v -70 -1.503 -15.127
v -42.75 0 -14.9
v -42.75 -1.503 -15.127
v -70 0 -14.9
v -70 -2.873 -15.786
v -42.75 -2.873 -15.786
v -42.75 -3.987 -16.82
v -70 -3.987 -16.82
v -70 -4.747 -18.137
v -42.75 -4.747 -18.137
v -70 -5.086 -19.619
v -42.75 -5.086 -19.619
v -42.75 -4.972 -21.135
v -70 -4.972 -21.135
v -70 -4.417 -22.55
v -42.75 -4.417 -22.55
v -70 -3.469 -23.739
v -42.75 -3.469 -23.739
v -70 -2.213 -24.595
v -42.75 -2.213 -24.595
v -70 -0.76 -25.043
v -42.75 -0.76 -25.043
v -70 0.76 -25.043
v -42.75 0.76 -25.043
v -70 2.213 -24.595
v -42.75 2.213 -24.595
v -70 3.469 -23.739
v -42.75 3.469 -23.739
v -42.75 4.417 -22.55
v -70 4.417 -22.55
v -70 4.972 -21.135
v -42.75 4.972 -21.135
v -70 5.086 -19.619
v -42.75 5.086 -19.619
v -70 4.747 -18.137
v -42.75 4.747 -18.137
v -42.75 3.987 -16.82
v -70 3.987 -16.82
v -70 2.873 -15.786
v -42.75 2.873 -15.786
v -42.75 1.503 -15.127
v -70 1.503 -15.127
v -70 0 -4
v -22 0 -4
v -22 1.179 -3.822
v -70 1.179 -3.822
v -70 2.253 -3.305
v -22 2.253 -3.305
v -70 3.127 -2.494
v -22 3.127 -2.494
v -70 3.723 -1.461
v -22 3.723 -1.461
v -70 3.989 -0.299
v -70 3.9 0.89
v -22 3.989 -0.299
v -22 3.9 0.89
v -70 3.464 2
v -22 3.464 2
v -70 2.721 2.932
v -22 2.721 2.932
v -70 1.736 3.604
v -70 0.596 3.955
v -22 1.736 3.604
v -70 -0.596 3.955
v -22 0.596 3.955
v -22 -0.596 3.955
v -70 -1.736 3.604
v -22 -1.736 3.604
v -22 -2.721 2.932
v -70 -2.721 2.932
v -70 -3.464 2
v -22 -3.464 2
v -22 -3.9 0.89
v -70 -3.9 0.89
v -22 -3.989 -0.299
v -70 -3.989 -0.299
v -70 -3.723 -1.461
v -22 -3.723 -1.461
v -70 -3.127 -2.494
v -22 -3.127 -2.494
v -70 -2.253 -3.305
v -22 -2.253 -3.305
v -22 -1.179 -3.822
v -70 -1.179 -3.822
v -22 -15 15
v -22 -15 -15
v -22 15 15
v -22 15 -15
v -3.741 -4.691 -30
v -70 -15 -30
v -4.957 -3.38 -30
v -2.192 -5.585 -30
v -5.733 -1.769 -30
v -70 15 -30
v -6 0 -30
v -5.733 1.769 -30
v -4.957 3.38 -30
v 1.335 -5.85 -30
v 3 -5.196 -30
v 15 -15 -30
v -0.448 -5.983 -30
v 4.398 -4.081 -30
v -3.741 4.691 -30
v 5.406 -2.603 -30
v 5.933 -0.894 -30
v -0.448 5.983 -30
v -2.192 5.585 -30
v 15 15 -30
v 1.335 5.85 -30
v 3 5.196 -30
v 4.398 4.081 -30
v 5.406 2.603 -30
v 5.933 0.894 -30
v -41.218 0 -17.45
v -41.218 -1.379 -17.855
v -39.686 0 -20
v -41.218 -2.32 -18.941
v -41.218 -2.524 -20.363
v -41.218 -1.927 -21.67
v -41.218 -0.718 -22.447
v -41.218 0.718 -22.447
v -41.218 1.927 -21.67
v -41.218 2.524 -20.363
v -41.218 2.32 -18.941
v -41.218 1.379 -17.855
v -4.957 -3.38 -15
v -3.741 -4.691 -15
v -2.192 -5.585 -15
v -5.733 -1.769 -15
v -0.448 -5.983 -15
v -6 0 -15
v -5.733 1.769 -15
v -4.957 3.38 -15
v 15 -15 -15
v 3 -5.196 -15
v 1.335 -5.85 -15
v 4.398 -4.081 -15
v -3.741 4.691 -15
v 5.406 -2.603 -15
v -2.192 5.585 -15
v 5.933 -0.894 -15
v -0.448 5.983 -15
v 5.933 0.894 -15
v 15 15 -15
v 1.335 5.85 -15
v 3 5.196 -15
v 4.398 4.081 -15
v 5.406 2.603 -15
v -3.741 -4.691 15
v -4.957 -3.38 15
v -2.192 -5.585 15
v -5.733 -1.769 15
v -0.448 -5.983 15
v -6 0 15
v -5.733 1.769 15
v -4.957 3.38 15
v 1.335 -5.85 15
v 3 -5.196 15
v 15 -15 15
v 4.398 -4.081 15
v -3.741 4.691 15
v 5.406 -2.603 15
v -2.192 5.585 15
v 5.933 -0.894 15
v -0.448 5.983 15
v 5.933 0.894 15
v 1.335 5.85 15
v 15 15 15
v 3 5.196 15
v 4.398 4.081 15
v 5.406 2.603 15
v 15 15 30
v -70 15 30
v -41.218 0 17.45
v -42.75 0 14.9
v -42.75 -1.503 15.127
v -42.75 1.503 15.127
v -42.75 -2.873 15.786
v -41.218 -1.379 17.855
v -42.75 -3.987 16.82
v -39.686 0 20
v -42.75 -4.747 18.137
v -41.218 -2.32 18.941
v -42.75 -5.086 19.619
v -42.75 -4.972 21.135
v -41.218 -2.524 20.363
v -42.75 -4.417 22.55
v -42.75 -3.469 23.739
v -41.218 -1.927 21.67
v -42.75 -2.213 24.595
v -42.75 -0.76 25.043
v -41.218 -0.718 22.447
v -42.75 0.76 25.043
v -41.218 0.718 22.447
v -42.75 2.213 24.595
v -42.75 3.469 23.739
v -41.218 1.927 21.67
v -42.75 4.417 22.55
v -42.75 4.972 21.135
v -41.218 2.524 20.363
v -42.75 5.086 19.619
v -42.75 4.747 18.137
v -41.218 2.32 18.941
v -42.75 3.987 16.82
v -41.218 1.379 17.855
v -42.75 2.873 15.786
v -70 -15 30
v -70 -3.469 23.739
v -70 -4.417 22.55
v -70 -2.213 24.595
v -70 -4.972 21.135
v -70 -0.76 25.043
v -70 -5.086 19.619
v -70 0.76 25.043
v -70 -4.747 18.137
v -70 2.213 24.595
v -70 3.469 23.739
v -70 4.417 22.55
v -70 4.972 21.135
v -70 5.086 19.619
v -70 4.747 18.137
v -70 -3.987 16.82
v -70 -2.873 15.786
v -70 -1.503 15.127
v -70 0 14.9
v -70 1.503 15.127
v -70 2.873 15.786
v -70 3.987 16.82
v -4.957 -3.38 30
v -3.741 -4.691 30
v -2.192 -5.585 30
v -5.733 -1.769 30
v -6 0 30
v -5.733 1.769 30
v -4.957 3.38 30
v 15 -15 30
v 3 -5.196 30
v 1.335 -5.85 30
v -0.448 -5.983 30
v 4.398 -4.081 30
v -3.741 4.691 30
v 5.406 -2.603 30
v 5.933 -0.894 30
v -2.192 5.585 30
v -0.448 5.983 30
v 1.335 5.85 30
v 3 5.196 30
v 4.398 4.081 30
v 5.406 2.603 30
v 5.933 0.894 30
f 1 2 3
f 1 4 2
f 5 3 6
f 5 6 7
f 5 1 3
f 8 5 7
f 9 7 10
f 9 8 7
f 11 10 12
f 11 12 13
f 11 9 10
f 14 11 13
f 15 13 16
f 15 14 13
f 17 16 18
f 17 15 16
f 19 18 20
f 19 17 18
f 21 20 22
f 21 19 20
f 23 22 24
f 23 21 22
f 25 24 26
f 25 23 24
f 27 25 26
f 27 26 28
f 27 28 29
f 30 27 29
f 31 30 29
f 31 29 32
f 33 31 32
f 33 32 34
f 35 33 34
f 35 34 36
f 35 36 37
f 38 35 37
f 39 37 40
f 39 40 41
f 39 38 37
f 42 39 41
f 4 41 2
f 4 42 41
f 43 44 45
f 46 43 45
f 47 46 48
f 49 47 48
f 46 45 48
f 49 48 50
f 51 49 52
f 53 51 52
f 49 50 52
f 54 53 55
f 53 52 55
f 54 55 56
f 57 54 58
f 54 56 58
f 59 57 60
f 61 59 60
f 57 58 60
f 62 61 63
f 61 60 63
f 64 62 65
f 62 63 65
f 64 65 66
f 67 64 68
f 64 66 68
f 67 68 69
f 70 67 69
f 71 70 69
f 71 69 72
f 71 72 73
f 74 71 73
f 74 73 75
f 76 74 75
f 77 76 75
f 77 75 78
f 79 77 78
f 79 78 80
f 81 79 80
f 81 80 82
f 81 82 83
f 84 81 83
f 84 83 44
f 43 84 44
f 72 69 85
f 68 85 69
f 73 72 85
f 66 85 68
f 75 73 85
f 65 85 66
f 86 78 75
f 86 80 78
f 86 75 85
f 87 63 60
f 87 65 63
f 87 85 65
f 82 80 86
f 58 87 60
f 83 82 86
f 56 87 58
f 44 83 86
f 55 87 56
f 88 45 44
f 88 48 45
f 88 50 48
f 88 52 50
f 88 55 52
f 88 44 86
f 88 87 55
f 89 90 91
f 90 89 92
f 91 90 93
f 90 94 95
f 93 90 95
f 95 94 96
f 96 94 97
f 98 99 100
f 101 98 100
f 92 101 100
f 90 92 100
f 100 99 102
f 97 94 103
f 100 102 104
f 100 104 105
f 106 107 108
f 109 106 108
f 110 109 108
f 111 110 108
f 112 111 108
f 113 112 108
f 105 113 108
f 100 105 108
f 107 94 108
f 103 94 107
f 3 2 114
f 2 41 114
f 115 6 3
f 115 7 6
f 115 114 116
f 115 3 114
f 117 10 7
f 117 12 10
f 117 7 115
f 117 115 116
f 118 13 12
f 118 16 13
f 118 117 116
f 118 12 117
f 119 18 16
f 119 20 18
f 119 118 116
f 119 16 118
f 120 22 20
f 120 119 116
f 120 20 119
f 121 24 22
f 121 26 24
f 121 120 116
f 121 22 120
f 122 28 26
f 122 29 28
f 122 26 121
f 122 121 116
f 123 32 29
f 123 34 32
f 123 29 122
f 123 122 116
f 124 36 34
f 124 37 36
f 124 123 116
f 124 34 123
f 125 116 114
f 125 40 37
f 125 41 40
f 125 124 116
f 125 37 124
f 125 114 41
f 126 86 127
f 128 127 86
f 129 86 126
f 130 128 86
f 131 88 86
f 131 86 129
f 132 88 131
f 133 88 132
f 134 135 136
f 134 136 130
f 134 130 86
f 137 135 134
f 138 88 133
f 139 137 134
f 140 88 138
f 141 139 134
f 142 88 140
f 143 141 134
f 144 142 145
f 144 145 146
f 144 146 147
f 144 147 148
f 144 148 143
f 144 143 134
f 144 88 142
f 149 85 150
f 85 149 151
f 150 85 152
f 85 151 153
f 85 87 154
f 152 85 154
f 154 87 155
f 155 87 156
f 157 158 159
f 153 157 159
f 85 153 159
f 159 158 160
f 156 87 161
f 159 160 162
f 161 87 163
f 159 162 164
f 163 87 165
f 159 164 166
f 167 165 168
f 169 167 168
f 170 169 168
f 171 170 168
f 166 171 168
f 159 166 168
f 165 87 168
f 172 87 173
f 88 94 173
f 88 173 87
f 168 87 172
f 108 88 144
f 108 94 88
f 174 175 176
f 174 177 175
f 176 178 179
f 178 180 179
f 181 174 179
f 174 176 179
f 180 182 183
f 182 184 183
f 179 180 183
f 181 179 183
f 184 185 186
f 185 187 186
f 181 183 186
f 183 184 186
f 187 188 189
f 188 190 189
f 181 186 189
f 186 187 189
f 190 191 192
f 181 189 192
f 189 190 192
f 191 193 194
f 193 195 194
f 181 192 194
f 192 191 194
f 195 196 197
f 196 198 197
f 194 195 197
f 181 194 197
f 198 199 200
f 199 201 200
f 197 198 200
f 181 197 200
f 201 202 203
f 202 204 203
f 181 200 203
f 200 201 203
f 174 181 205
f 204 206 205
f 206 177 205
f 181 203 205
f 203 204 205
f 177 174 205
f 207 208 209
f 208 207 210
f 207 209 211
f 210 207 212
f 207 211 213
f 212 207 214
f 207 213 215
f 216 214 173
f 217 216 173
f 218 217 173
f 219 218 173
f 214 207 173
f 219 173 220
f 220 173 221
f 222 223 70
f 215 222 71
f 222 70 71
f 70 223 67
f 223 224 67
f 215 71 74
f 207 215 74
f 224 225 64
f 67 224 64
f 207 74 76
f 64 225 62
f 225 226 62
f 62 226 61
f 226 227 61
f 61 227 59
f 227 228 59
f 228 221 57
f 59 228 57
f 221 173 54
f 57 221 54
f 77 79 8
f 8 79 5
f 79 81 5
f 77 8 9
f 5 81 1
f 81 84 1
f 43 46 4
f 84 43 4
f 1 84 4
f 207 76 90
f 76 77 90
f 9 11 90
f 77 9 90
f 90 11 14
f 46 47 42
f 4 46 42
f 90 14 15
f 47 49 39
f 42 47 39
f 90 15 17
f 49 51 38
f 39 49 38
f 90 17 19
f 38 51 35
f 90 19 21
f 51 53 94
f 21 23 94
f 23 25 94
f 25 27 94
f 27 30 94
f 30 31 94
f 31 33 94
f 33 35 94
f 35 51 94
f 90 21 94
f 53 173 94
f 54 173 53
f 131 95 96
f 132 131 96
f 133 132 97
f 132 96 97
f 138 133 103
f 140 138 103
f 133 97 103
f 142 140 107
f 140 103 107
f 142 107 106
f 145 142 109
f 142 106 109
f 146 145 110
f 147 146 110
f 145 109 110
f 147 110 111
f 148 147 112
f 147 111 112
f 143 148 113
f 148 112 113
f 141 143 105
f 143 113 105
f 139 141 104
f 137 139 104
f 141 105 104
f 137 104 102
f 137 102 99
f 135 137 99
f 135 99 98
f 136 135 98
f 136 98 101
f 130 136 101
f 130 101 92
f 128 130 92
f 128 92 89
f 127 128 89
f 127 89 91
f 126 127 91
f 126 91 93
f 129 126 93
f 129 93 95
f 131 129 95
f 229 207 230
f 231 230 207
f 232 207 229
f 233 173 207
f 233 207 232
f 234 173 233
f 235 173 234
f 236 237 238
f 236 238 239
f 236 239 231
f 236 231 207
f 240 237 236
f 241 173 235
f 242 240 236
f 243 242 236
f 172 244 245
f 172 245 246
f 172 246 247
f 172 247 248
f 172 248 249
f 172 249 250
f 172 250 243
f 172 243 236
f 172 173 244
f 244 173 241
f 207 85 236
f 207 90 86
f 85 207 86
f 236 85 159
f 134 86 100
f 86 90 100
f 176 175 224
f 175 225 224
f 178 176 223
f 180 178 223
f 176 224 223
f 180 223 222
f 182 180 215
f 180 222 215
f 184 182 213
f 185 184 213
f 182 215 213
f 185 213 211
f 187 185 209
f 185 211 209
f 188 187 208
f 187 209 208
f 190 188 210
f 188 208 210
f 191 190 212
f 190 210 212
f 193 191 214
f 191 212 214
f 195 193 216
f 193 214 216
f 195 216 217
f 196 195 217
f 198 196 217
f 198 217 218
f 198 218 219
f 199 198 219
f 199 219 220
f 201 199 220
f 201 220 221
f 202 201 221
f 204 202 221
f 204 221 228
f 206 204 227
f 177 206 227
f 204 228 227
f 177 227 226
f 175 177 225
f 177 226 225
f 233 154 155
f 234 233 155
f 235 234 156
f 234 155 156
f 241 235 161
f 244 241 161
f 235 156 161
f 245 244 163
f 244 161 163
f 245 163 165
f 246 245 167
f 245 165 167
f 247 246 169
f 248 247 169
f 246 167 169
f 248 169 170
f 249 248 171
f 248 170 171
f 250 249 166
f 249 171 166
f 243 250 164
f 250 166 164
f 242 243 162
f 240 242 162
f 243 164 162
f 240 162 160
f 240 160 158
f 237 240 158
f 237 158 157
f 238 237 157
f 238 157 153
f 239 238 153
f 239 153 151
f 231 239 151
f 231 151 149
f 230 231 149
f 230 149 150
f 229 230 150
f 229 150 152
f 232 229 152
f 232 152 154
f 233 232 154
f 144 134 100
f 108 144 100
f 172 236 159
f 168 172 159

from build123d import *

# Parameters (mm, degrees)
SKETCH1_W                  = 85
SKETCH1_H                  = 60
EXTRUDE1_DEPTH             = 15
F_12_0_12_DIAMETER_HOLE1_D = 12
SKETCH4_W                  = 37
SKETCH4_H                  = 30
CUT_EXTRUDE1_DEPTH         = 82.853527719
F_8_0_8_DIAMETER_HOLE1_D   = 8


with BuildPart() as part:
    # Sketch1 → Extrude1 (new, symmetric)
    with BuildSketch(Plane(origin=(0, 0, 0), x_dir=(1, 0, 0), z_dir=(0, 1, 0))):
        with Locations((-27.5, 0)):
            Rectangle(SKETCH1_W, SKETCH1_H)
    extrude(amount=EXTRUDE1_DEPTH, both=True)

    # Ø12.0 (12) Diameter Hole1 (through all)
    with Locations(Plane.XY.offset(30)):
        with Locations((0, 0)):
            Hole(F_12_0_12_DIAMETER_HOLE1_D / 2)

    # Sketch4 → Cut-Extrude1 (cut, through all)
    with BuildSketch(Plane(origin=(0, 15, 0), x_dir=(1, 0, 0), z_dir=(0, 1, 0))):
        with Locations((-3.5, 0)):
            Rectangle(SKETCH4_W, SKETCH4_H)
    extrude(amount=-CUT_EXTRUDE1_DEPTH, mode=Mode.SUBTRACT)

    # Ø8.0 (8) Diameter Hole1 (through all)
    with Locations(Plane.ZY.offset(70)):
        with Locations((0, 0)):
            Hole(F_8_0_8_DIAMETER_HOLE1_D / 2)

    # Sketch9 → M12x1.75 Tapped Hole1 (revolve, cut)
    with BuildSketch(Plane(origin=(-70, 0, -20), x_dir=(0, 0, 1), z_dir=(0, 1, 0))):
        Polygon((0, 0), (0, 30.314389157), (5.1, 27.25), (5.1, 0), align=None)
    m12x1_75_tapped_hole1 = revolve(axis=Axis((-76.35, 0, -20), (1, 0, 0)), mode=Mode.SUBTRACT)

    # Mirror1: M12x1.75 Tapped Hole1 across plane
    add(m12x1_75_tapped_hole1.mirror(Plane.XY), mode=Mode.SUBTRACT)


solid = part.part
